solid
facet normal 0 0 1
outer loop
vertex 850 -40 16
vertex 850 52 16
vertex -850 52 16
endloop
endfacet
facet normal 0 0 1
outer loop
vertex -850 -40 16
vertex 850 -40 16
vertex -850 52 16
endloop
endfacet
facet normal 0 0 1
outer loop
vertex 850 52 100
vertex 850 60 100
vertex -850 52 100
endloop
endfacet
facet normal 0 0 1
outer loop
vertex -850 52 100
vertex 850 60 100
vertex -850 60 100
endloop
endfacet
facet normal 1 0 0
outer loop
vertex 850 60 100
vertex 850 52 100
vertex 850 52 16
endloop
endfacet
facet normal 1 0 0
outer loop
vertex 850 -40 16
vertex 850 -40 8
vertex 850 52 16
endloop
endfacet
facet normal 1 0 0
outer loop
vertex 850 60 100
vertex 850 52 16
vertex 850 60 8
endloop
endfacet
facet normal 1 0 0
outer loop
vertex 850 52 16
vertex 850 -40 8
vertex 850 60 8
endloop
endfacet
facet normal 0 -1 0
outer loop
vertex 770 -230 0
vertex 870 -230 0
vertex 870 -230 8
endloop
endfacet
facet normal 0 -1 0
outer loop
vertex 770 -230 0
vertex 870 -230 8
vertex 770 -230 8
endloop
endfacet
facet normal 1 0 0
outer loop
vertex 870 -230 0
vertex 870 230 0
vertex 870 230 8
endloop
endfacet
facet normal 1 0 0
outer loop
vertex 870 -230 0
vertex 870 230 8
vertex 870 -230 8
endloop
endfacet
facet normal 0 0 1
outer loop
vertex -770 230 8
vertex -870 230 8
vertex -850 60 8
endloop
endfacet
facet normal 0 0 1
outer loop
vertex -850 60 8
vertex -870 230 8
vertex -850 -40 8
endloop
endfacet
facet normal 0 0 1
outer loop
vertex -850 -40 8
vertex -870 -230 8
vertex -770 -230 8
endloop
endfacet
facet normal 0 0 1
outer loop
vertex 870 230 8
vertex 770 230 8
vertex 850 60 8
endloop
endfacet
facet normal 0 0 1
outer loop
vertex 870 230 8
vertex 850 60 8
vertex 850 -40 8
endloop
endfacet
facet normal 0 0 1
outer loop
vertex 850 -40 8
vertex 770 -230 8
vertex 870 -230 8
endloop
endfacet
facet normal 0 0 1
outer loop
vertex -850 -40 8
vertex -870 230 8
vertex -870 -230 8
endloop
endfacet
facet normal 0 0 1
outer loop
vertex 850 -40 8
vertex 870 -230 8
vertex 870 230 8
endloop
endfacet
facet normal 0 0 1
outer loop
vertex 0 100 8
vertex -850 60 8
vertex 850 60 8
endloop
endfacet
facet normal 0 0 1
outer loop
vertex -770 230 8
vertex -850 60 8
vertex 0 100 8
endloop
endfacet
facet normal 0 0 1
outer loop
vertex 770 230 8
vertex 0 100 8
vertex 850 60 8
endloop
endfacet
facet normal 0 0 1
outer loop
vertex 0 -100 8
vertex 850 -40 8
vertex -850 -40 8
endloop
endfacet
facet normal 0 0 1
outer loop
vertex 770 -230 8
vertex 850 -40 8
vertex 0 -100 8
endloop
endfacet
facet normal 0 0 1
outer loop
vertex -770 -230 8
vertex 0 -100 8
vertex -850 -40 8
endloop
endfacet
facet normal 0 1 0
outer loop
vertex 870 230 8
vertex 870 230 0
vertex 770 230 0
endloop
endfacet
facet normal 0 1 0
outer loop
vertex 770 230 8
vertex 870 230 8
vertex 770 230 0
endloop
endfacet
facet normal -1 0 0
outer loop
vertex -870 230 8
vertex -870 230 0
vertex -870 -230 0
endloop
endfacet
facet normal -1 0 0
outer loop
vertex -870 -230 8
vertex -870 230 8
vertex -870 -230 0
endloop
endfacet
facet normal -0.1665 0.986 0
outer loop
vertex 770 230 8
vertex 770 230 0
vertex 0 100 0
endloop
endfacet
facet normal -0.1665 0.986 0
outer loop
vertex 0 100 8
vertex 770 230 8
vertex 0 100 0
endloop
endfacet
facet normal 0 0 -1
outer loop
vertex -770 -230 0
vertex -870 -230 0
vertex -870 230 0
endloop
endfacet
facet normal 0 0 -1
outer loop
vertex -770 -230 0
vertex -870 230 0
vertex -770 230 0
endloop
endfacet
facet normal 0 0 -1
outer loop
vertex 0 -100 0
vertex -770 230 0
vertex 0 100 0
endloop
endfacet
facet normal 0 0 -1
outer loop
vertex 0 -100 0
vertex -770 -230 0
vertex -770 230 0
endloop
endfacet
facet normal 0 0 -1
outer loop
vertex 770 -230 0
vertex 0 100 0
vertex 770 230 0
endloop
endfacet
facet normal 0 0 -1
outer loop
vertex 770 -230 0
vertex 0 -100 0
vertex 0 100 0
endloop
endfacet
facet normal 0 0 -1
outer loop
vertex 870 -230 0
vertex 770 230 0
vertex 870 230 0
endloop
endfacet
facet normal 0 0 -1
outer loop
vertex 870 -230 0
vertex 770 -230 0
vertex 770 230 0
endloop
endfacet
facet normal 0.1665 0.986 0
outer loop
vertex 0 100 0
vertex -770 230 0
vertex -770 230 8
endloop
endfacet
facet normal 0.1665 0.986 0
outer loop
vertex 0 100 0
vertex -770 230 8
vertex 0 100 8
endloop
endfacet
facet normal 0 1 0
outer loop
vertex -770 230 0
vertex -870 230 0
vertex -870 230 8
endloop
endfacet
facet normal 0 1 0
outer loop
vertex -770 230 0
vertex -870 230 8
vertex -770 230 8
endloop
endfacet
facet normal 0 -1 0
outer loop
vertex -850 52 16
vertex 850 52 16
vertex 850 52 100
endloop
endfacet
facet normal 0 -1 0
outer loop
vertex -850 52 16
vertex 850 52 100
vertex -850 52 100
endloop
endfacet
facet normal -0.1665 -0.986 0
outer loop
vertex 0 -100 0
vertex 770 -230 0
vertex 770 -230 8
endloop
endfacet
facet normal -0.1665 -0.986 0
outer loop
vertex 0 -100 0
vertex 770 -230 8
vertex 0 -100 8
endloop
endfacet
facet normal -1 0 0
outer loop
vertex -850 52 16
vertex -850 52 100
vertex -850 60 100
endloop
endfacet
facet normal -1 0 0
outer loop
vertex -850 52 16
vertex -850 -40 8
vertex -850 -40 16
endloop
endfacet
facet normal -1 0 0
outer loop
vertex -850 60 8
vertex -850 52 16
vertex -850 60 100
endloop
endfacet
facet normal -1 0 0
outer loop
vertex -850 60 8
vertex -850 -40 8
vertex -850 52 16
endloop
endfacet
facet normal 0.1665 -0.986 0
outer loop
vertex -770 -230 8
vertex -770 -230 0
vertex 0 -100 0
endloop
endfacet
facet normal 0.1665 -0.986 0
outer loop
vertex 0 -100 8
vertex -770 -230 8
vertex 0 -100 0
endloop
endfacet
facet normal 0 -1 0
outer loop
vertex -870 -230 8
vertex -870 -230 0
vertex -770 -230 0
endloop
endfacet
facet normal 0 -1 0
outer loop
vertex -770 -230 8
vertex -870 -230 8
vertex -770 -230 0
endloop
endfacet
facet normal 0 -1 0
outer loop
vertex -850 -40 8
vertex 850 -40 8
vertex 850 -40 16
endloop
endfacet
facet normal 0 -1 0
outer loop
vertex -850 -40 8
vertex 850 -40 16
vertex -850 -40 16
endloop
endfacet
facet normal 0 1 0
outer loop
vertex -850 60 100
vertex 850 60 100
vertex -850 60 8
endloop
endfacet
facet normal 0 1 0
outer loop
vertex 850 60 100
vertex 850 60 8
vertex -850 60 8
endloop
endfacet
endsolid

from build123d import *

# Parameters (mm, degrees)
EXTRUDE_2_DEPTH       = 8
SKETCH_5_W            = 850
SKETCH_5_H            = 100
EXTRUDE_3_DEPTH       = 8
SKETCH_6_W            = 850
SKETCH_6_H            = 8
EXTRUDE_4_DEPTH       = 84
MIRROR_7_COPY_1_DEPTH = 8


with BuildPart() as part:
    # 草图1 → 凸台-拉伸2 (new body)
    with BuildSketch(Plane.XY):
        Polygon((-870, 0), (-870, 230), (-770, 230), (0, 100), (0, 0), align=None)
    extrude_2 = extrude(amount=EXTRUDE_2_DEPTH)

    # 镜向2: 凸台-拉伸2 across plane
    add(extrude_2.mirror(Plane.ZX))

    # 草图5 → 凸台-拉伸3 (add)
    with BuildSketch(Plane.XY.offset(8)):
        with Locations((-425, 10)):
            Rectangle(SKETCH_5_W, SKETCH_5_H)
    extrude_3 = extrude(amount=EXTRUDE_3_DEPTH)

    # 草图6 → 凸台-拉伸4 (add)
    with BuildSketch(Plane.XY.offset(16)):
        with Locations((-425, 56)):
            Rectangle(SKETCH_6_W, SKETCH_6_H)
    extrude_4 = extrude(amount=EXTRUDE_4_DEPTH)

    # 镜向7: 凸台-拉伸2, 凸台-拉伸3, 凸台-拉伸4 across plane
    add(extrude_2.mirror(Plane(origin=(0, 0, 0), x_dir=(0, 0, 1), z_dir=(1, 0, 0))))
    add(extrude_3.mirror(Plane(origin=(0, 0, 0), x_dir=(0, 0, 1), z_dir=(1, 0, 0))))
    add(extrude_4.mirror(Plane(origin=(0, 0, 0), x_dir=(0, 0, 1), z_dir=(1, 0, 0))))

    # 镜向7 copy 1 sketch → 镜向7 copy 1 (add)
    with BuildSketch(Plane(origin=(0, 0, 0), x_dir=(-1, 0, 0), z_dir=(0, 0, 1))):
        Polygon((-870, 0), (-870, 230), (-770, 230), (0, 100), (0, 0), align=None)
    extrude(amount=MIRROR_7_COPY_1_DEPTH)


solid = part.part
